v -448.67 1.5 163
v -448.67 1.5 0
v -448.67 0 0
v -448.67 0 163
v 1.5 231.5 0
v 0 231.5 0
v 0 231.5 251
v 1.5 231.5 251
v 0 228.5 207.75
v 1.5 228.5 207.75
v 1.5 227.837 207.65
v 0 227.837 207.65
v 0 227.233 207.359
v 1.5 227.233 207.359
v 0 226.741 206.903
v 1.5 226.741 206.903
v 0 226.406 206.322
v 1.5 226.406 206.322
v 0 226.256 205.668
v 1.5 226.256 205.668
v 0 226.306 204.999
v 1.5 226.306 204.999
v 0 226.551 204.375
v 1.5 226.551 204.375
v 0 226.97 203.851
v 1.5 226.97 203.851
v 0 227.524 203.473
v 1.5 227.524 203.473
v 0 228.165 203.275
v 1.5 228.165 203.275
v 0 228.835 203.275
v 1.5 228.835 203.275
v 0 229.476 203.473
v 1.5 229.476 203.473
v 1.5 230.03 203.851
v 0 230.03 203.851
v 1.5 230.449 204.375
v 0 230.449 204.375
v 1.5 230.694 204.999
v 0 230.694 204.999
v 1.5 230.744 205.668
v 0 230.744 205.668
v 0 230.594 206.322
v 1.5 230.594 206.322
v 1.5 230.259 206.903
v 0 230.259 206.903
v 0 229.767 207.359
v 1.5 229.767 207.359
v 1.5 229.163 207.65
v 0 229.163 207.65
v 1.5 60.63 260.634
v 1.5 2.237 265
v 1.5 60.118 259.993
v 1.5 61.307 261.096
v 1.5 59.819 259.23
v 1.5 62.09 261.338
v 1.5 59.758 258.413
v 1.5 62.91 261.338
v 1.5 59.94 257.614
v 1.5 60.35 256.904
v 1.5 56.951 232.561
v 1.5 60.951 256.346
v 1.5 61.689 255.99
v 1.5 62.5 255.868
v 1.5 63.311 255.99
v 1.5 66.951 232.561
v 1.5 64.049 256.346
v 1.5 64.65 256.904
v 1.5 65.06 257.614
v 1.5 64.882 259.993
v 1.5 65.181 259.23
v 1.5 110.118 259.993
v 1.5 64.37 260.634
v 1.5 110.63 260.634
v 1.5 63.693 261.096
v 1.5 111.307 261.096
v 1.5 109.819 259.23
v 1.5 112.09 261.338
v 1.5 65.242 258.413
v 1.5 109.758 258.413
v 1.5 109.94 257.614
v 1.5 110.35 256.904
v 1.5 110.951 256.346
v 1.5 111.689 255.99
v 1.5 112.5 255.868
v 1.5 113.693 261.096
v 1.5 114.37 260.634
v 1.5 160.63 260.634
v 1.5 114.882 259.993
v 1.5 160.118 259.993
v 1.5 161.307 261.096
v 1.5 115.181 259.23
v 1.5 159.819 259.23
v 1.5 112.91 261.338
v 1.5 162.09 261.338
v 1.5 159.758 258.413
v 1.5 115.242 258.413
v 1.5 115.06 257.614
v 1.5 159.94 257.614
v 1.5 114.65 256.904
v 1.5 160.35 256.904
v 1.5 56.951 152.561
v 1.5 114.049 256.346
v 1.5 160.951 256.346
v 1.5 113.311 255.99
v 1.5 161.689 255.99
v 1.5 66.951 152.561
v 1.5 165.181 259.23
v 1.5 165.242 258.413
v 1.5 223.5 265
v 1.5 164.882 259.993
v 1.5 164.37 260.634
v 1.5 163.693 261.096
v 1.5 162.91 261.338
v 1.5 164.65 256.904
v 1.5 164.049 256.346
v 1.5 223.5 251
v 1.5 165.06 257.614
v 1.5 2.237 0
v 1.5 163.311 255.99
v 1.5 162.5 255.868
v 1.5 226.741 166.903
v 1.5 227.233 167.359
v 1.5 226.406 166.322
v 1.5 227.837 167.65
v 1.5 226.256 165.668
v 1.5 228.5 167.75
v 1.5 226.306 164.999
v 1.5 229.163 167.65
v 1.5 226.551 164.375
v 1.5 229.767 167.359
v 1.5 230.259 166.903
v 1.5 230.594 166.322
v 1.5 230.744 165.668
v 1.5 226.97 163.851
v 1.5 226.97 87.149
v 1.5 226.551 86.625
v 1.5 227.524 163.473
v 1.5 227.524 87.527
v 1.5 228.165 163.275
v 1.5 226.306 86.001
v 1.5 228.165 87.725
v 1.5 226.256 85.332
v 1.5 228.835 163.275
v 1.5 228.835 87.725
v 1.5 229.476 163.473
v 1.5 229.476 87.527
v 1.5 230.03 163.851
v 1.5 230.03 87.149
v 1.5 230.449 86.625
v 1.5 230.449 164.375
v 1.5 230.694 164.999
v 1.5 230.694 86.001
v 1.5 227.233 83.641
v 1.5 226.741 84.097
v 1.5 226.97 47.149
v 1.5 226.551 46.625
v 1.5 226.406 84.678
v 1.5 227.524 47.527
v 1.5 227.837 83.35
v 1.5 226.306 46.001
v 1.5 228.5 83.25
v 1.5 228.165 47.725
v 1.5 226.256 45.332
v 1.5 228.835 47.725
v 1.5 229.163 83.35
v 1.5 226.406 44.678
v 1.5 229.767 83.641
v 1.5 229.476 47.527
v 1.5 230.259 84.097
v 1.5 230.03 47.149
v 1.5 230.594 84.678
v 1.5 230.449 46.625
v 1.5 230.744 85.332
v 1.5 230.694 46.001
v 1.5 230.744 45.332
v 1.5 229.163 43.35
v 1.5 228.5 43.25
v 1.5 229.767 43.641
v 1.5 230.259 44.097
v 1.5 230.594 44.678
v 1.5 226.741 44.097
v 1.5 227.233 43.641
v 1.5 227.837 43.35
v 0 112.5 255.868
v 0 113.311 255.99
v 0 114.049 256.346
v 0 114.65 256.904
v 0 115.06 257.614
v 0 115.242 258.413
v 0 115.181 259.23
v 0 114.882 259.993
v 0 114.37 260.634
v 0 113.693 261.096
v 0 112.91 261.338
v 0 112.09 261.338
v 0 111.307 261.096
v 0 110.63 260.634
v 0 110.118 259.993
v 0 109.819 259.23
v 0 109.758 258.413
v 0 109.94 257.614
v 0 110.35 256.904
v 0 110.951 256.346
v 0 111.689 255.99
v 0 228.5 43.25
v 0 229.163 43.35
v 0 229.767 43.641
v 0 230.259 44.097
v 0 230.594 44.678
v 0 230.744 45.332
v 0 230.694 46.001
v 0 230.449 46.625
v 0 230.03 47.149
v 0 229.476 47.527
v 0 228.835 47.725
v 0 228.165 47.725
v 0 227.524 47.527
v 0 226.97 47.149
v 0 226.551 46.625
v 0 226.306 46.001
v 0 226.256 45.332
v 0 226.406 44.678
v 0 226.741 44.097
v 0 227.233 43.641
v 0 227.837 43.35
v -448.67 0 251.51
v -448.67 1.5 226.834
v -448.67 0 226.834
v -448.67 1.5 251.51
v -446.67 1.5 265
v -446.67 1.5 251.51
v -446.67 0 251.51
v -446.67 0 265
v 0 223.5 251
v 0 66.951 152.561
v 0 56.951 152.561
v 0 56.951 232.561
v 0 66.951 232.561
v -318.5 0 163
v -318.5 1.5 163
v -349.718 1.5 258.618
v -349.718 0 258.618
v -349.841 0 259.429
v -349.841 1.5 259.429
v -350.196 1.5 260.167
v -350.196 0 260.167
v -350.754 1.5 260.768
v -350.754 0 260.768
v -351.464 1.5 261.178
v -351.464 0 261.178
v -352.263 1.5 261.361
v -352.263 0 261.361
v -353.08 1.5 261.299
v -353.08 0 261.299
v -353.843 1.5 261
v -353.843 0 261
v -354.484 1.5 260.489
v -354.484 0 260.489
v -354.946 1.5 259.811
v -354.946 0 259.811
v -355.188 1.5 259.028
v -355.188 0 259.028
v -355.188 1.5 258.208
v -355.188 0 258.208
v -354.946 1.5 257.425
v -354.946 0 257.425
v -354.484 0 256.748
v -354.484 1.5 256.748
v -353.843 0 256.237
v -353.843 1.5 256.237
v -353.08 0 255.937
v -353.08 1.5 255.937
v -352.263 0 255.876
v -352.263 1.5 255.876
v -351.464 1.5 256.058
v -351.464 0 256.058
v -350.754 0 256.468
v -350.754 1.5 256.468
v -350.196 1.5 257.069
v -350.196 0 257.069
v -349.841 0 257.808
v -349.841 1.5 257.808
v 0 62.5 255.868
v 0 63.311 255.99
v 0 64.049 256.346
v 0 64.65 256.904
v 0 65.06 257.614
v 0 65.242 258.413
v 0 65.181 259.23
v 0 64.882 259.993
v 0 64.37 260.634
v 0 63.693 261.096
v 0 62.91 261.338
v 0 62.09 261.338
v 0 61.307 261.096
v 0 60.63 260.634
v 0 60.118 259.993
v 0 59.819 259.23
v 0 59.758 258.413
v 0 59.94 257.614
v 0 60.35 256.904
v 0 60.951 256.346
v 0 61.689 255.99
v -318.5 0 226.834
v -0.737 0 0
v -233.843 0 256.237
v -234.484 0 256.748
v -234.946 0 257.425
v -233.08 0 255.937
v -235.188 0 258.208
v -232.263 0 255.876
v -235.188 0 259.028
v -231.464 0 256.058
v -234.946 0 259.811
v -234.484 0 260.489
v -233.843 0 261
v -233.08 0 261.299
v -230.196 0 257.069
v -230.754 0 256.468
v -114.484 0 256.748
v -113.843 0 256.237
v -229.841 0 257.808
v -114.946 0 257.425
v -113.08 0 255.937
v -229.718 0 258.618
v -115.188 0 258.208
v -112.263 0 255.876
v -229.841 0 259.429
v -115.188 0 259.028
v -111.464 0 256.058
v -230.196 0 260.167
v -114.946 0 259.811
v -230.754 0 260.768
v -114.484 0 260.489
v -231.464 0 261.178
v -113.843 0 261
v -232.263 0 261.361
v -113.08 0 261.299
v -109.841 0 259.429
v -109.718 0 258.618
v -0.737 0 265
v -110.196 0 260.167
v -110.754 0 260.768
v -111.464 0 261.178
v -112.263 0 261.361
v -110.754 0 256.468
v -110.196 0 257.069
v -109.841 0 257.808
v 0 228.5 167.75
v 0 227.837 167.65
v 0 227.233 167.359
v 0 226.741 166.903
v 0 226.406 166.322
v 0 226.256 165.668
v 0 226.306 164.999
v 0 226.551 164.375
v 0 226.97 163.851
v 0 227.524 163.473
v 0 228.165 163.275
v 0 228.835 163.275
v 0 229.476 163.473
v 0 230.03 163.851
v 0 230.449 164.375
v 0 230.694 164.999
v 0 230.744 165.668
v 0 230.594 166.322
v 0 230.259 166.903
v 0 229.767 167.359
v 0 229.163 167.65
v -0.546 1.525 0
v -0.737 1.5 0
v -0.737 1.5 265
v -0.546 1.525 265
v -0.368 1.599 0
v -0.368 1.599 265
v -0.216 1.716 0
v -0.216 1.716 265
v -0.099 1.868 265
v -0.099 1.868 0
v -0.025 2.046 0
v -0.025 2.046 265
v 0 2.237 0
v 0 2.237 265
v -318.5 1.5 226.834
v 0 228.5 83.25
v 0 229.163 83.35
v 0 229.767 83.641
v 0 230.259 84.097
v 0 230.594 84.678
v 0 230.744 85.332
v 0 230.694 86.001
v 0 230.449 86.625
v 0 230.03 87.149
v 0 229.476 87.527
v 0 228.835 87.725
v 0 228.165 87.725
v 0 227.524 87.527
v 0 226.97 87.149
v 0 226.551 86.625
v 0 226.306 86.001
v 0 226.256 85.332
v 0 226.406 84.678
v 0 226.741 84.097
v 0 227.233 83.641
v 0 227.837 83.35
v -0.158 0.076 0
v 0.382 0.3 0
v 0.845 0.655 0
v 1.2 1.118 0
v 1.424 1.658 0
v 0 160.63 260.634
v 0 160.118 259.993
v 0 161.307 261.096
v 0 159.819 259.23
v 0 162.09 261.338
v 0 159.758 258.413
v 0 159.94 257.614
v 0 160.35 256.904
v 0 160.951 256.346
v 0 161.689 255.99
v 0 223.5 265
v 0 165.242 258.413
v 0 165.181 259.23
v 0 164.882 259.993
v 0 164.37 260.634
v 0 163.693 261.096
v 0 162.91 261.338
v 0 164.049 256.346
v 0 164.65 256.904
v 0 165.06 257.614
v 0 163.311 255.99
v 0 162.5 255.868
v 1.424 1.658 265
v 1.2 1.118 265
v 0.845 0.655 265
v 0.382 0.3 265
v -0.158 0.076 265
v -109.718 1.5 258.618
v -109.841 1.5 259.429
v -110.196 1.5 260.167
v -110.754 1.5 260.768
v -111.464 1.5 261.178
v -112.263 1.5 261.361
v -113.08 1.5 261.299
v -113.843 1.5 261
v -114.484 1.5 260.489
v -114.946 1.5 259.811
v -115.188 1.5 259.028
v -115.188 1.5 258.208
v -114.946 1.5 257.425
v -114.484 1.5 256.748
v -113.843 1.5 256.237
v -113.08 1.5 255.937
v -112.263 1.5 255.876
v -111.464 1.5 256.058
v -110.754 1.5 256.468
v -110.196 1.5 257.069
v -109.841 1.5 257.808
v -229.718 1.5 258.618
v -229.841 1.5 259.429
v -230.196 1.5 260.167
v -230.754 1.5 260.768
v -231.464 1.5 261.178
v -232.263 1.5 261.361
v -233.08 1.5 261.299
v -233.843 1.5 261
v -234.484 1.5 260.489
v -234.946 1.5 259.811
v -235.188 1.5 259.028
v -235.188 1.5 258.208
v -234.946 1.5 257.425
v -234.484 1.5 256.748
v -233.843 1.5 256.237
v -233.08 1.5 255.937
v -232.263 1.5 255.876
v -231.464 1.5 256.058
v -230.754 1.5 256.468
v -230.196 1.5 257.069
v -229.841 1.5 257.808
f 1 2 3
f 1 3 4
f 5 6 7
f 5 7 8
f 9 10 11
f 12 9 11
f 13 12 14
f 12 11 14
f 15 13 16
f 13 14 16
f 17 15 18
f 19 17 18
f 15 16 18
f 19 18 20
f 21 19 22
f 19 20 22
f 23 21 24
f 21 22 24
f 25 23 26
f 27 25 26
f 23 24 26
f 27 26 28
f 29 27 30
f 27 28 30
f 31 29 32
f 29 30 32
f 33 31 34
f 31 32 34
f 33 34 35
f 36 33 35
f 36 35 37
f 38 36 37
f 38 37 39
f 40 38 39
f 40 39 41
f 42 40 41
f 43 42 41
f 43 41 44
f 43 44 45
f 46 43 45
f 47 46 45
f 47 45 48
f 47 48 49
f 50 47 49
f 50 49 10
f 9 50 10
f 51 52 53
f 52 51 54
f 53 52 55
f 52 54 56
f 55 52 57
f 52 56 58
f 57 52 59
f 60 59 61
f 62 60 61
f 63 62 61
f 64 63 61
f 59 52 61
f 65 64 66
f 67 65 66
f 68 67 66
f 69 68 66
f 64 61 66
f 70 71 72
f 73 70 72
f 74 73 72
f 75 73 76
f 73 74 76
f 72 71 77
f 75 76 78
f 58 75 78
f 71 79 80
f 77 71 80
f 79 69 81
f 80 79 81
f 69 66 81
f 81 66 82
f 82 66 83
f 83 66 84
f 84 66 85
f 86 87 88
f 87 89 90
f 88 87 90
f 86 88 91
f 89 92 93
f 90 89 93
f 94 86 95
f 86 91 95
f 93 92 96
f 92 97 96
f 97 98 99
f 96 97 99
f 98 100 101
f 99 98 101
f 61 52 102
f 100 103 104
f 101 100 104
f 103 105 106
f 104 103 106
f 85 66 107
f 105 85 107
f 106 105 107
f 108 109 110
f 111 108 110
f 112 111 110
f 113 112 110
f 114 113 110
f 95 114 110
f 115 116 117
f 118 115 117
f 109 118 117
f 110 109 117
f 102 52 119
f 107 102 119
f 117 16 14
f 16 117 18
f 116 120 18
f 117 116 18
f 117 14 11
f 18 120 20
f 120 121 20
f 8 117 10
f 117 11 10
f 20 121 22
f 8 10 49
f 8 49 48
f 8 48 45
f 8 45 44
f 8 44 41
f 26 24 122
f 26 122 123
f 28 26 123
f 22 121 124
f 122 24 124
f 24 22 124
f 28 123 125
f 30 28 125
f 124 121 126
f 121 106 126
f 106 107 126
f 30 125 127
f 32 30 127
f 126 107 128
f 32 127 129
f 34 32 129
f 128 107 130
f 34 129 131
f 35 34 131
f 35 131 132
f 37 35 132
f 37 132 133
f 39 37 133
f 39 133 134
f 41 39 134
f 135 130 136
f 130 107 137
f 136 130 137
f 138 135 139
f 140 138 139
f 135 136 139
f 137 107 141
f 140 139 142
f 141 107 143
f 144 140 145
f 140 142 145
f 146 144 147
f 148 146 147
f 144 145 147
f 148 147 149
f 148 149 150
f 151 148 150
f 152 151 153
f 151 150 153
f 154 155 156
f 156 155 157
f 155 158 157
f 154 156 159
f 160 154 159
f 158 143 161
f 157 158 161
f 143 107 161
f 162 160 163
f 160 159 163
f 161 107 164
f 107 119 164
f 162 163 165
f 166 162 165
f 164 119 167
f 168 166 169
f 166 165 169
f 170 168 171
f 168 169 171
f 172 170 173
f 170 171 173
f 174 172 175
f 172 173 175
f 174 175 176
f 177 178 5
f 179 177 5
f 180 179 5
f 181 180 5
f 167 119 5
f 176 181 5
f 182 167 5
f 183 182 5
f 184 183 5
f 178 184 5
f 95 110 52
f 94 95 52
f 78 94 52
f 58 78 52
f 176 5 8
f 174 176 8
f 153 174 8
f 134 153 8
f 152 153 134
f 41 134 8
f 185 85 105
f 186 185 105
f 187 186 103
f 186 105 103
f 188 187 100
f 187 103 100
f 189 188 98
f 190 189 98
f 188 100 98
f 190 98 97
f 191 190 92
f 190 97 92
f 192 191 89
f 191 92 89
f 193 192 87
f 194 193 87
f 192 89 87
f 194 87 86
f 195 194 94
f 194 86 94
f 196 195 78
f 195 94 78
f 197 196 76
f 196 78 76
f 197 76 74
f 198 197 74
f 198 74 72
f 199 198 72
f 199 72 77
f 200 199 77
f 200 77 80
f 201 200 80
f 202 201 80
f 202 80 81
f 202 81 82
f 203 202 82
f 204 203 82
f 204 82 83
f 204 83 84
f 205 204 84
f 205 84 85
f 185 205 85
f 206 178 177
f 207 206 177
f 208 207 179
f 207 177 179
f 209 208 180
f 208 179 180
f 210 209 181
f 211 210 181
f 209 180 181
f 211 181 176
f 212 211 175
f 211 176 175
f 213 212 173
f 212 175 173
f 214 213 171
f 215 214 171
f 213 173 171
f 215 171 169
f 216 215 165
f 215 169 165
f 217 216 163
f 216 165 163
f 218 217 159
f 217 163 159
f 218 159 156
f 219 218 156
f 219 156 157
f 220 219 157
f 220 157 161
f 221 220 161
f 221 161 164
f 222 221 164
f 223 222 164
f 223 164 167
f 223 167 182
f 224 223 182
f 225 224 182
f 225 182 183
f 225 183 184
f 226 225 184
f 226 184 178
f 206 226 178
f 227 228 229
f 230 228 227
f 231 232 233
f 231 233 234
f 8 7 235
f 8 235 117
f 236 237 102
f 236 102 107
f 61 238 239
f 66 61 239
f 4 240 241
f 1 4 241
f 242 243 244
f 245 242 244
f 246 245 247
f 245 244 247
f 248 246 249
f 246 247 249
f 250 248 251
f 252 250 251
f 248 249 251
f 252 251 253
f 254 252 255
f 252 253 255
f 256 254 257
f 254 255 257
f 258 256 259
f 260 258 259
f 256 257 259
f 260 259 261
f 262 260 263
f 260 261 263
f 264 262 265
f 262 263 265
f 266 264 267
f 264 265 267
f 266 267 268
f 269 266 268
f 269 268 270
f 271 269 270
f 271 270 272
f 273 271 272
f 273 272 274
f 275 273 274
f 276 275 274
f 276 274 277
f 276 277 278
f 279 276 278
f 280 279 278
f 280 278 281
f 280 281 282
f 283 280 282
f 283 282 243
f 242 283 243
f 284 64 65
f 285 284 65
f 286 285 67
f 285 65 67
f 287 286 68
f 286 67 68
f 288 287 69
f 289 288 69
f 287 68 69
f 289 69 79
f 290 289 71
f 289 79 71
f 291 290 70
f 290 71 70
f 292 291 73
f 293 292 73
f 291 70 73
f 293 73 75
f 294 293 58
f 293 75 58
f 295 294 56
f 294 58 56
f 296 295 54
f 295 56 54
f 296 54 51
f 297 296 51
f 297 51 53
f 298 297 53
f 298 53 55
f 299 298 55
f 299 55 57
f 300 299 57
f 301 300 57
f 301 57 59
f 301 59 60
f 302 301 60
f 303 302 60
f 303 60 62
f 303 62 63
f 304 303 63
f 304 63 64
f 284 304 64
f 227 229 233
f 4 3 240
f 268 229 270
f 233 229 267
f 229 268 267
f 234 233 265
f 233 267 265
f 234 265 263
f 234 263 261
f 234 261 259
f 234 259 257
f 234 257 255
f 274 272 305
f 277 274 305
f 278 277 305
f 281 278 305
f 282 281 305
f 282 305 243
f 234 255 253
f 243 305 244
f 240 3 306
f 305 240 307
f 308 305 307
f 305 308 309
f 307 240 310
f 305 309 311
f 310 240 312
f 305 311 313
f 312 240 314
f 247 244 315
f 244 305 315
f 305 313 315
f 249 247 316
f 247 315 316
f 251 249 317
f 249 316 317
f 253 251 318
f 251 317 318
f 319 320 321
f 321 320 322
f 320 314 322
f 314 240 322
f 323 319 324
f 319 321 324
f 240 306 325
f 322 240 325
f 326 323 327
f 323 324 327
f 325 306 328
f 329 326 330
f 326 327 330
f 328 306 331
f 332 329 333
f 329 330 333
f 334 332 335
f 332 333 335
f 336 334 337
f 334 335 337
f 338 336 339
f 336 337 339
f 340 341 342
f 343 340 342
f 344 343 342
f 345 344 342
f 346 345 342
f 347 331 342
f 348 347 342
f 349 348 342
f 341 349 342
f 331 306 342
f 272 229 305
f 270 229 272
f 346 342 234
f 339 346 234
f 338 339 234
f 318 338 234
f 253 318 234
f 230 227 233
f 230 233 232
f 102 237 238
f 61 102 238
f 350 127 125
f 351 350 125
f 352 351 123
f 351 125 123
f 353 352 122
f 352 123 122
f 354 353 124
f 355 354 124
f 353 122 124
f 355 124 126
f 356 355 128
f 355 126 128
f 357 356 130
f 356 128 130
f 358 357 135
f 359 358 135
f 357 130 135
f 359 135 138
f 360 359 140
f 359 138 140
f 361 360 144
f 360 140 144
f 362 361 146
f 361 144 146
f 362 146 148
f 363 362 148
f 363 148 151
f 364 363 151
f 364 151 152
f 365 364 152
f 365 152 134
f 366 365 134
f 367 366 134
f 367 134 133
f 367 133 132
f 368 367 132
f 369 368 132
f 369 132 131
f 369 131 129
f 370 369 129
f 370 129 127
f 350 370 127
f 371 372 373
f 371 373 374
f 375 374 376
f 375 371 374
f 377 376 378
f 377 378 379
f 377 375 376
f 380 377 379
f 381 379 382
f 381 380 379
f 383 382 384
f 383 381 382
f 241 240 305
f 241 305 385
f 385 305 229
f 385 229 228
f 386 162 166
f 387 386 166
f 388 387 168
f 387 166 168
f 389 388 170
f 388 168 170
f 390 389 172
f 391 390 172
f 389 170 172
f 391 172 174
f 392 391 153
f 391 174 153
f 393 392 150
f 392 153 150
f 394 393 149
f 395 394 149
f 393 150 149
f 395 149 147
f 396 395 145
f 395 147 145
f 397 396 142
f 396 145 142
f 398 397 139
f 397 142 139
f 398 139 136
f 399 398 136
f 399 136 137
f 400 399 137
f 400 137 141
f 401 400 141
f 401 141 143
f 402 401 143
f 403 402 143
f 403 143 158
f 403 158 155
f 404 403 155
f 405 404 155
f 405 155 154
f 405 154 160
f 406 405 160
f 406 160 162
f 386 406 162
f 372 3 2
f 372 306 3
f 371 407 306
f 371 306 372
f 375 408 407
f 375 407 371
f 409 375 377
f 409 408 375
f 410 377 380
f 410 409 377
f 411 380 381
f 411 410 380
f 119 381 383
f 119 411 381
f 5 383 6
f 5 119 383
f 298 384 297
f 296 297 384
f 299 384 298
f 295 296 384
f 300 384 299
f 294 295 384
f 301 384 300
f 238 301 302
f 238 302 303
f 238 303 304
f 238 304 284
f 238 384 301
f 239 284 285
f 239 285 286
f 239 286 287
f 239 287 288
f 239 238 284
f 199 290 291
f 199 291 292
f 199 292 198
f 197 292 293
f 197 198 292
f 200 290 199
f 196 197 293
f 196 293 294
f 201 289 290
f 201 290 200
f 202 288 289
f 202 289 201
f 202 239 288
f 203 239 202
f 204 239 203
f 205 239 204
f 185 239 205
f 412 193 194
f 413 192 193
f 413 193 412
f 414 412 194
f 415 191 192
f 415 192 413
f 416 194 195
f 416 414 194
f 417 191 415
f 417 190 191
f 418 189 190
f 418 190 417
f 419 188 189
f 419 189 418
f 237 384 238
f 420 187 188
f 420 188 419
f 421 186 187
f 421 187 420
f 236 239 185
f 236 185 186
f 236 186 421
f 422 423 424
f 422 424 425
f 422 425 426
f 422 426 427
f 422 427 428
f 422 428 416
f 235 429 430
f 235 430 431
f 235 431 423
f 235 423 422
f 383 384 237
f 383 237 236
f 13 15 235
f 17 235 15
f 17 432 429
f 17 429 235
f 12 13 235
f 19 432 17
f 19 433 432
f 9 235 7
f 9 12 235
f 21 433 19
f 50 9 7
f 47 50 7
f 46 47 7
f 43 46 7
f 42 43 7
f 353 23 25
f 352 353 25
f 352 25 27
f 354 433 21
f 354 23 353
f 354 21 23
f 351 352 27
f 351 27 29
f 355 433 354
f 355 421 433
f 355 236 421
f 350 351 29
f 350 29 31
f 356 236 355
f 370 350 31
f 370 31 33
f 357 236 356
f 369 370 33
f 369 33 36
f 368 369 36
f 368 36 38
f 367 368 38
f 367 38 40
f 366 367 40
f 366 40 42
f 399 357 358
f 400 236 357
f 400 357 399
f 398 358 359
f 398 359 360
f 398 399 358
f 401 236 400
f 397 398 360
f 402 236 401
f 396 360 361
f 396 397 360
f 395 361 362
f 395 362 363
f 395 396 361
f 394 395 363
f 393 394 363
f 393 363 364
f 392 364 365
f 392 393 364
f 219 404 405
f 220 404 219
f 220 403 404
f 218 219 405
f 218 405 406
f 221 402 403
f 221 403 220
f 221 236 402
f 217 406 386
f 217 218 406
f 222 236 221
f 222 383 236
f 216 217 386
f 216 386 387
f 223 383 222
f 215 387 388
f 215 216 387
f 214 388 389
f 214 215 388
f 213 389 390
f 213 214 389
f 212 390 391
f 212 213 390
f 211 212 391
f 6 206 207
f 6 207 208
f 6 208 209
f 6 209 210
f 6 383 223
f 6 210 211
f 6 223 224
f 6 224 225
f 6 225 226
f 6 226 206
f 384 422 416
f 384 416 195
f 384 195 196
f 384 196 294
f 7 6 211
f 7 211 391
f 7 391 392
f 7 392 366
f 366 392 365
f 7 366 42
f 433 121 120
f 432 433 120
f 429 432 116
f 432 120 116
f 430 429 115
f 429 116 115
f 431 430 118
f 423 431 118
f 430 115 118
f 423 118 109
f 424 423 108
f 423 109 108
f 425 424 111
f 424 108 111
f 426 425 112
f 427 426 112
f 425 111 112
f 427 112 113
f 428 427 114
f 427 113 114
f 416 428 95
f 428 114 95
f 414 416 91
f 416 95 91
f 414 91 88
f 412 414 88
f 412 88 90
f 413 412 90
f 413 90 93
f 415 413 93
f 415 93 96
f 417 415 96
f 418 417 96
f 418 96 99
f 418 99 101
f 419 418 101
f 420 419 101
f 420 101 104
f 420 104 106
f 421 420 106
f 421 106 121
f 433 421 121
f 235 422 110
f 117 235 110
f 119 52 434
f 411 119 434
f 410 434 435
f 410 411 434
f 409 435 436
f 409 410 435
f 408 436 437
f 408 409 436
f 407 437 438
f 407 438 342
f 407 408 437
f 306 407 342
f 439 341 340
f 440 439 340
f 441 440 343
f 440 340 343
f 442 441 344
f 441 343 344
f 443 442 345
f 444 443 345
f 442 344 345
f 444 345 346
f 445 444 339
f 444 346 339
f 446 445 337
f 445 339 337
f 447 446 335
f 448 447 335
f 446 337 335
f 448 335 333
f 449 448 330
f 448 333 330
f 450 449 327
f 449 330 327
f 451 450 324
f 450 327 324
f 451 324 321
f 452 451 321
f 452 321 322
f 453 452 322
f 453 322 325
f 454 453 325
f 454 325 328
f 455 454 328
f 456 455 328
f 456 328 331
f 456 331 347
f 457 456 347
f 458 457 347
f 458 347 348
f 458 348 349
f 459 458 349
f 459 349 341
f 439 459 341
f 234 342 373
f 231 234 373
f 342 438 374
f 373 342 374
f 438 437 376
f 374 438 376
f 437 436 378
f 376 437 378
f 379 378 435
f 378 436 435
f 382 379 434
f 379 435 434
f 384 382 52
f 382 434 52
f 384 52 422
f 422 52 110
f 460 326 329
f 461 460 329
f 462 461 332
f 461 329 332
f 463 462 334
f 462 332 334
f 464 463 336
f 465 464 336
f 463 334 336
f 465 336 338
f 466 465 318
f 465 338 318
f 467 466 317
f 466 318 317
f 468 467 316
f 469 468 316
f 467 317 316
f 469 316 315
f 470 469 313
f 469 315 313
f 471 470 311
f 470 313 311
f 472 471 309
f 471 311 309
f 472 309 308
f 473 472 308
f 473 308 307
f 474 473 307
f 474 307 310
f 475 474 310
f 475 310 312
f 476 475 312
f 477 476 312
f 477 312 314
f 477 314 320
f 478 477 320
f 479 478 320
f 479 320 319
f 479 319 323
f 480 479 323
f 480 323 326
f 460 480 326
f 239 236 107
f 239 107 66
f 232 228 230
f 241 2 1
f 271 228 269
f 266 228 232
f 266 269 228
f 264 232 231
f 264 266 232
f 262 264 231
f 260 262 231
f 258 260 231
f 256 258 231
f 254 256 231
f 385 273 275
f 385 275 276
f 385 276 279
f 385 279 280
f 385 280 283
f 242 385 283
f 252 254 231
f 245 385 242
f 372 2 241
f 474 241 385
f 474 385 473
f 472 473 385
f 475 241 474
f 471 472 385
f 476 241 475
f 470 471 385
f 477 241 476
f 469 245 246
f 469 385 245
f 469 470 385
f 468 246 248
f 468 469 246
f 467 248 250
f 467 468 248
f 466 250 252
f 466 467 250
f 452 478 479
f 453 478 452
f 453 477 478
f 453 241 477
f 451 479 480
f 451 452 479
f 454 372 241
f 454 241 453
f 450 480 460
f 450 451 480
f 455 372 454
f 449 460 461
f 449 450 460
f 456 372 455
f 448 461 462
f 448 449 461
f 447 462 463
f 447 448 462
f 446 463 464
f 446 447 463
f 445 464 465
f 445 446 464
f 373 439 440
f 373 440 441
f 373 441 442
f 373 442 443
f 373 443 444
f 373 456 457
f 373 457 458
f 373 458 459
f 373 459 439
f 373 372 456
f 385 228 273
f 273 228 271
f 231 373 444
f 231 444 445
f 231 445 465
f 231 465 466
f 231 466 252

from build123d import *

# Parameters (mm, degrees)
SKETCH_2_W                       = 1.5
SKETCH_2_H                       = 231.5
SM_BASE_FLANGE_1_DEPTH           = 265
SKETCH_3_W                       = 2.488275725
SKETCH_3_H                       = 14
CUT_EXTRUDE_1_DEPTH              = 8
SKETCH_4_W                       = 80
SKETCH_4_H                       = 10
CUT_EXTRUDE_2_DEPTH              = 6
SM_EDGE_FLANGE_1_STRIP_W         = 7.4732
SM_EDGE_FLANGE_1_STRIP_H         = 1.5
SM_EDGE_FLANGE_1_STRIP_CUT_DEPTH = 265
SM_EDGE_FLANGE_1_DEPTH           = 265
SKETCH_10_W                      = 163
SKETCH_10_H                      = 1.5
EXTRUDE_1_DEPTH                  = 130.17
SKETCH_11_W                      = 38.16564302
SKETCH_11_H                      = 1.5
EXTRUDE_2_DEPTH                  = 130.17
SKETCH_12_R                      = 2.75
CUT_EXTRUDE_3_DEPTH              = 20
SKETCH_13_R                      = 2.75
CUT_EXTRUDE_4_DEPTH              = 10
SKETCH_14_W                      = 13.490100929
SKETCH_14_H                      = 1.5
CUT_EXTRUDE_5_DEPTH              = 2
SKETCH_15_R                      = 2.25
CUT_EXTRUDE_6_DEPTH              = 10


# Sheet-metal steps are written as plain solids
with BuildPart() as part:
    # Sketch 2 → 基体-法兰1 (new body)
    with BuildSketch(Plane.XY):
        with Locations((0.75, 115.75)):
            Rectangle(SKETCH_2_W, SKETCH_2_H)
    extrude(amount=SM_BASE_FLANGE_1_DEPTH)

    # 草图3 → 切除-拉伸1 (cut)
    with BuildSketch(Plane(origin=(0, 231.5, 0), x_dir=(1, 0, 0), z_dir=(0, 1, 0))):
        with Locations((1.244137863, -258)):
            Rectangle(SKETCH_3_W, SKETCH_3_H)
    extrude(amount=-CUT_EXTRUDE_1_DEPTH, mode=Mode.SUBTRACT)

    # 草图4 → 切除-拉伸2 (cut)
    with BuildSketch(Plane.ZY):
        with Locations((192.56107144, 61.95061584)):
            Rectangle(SKETCH_4_W, SKETCH_4_H)
    extrude(amount=-CUT_EXTRUDE_2_DEPTH, mode=Mode.SUBTRACT)

    # 边线-法兰1 strip (across the edge) → 边线-法兰1 strip cut (cut)
    with BuildSketch(Plane(origin=(0, 0, 0), x_dir=(0, 1, 0), z_dir=(0, 0, 1))):
        with Locations((-1.5, -0.75)):
            Rectangle(SM_EDGE_FLANGE_1_STRIP_W, SM_EDGE_FLANGE_1_STRIP_H)
    extrude(amount=SM_EDGE_FLANGE_1_STRIP_CUT_DEPTH, mode=Mode.SUBTRACT)

    # 边线-法兰1 section (across the edge) → 边线-法兰1 (add)
    with BuildSketch(Plane(origin=(0, 0, 0), x_dir=(0, 1, 0), z_dir=(0, 0, 1))):
        with BuildLine():
            Line((0, 0.7366), (0, 318.5))
            Line((0, 318.5), (1.5, 318.5))
            Line((1.5, 318.5), (1.5, 0.7366))
            ThreePointArc((1.5, 0.7366), (1.715745145, 0.215745145), (2.2366, 0))
            Line((2.2366, 0), (2.2366, -1.5))
            ThreePointArc((2.2366, -1.5), (0.655084973, -0.844915027), (0, 0.7366))
        make_face()
    extrude(amount=SM_EDGE_FLANGE_1_DEPTH)

    # 草图10 → 凸台-拉伸1 (add)
    with BuildSketch(Plane.ZY.offset(318.5)):
        with Locations((81.5, 0.75)):
            Rectangle(SKETCH_10_W, SKETCH_10_H)
    extrude(amount=EXTRUDE_1_DEPTH)

    # 草图11 → 凸台-拉伸2 (add)
    with BuildSketch(Plane.ZY.offset(318.5)):
        with Locations((245.91717849, 0.75)):
            Rectangle(SKETCH_11_W, SKETCH_11_H)
    extrude(amount=EXTRUDE_2_DEPTH)

    # 草图12 → 切除-拉伸3 (cut)
    with BuildSketch(Plane(origin=(1.5, 0, 0), x_dir=(0, 0, -1), z_dir=(1, 0, 0))):
        with Locations((-258.6183, 162.5)):
            Circle(SKETCH_12_R)
        with Locations((-258.6183, 112.5)):
            Circle(SKETCH_12_R)
        with Locations((-258.6183, 62.5)):
            Circle(SKETCH_12_R)
    extrude(amount=-CUT_EXTRUDE_3_DEPTH, mode=Mode.SUBTRACT)

    # 草图13 → 切除-拉伸4 (cut)
    with BuildSketch(Plane.XZ):
        with Locations((-352.4684, 258.6183)):
            Circle(SKETCH_13_R)
        with Locations((-232.4684, 258.6183)):
            Circle(SKETCH_13_R)
        with Locations((-112.4684, 258.6183)):
            Circle(SKETCH_13_R)
    extrude(amount=-CUT_EXTRUDE_4_DEPTH, mode=Mode.SUBTRACT)

    # 草图14 → 切除-拉伸5 (cut)
    with BuildSketch(Plane.ZY.offset(448.67)):
        with Locations((258.254949536, 0.75)):
            Rectangle(SKETCH_14_W, SKETCH_14_H)
    extrude(amount=-CUT_EXTRUDE_5_DEPTH, mode=Mode.SUBTRACT)

    # 草图15 → 切除-拉伸6 (cut)
    with BuildSketch(Plane(origin=(1.5, 0, 0), x_dir=(0, 0, -1), z_dir=(1, 0, 0))):
        with Locations((-45.5, 228.5)):
            Circle(SKETCH_15_R)
        with Locations((-85.5, 228.5)):
            Circle(SKETCH_15_R)
        with Locations(Location((-205.5, 228.5, 0), (0, 0, 180))):
            Circle(SKETCH_15_R)
        with Locations(Location((-165.5, 228.5, 0), (0, 0, 180))):
            Circle(SKETCH_15_R)
    extrude(amount=-CUT_EXTRUDE_6_DEPTH, mode=Mode.SUBTRACT)


solid = part.part
